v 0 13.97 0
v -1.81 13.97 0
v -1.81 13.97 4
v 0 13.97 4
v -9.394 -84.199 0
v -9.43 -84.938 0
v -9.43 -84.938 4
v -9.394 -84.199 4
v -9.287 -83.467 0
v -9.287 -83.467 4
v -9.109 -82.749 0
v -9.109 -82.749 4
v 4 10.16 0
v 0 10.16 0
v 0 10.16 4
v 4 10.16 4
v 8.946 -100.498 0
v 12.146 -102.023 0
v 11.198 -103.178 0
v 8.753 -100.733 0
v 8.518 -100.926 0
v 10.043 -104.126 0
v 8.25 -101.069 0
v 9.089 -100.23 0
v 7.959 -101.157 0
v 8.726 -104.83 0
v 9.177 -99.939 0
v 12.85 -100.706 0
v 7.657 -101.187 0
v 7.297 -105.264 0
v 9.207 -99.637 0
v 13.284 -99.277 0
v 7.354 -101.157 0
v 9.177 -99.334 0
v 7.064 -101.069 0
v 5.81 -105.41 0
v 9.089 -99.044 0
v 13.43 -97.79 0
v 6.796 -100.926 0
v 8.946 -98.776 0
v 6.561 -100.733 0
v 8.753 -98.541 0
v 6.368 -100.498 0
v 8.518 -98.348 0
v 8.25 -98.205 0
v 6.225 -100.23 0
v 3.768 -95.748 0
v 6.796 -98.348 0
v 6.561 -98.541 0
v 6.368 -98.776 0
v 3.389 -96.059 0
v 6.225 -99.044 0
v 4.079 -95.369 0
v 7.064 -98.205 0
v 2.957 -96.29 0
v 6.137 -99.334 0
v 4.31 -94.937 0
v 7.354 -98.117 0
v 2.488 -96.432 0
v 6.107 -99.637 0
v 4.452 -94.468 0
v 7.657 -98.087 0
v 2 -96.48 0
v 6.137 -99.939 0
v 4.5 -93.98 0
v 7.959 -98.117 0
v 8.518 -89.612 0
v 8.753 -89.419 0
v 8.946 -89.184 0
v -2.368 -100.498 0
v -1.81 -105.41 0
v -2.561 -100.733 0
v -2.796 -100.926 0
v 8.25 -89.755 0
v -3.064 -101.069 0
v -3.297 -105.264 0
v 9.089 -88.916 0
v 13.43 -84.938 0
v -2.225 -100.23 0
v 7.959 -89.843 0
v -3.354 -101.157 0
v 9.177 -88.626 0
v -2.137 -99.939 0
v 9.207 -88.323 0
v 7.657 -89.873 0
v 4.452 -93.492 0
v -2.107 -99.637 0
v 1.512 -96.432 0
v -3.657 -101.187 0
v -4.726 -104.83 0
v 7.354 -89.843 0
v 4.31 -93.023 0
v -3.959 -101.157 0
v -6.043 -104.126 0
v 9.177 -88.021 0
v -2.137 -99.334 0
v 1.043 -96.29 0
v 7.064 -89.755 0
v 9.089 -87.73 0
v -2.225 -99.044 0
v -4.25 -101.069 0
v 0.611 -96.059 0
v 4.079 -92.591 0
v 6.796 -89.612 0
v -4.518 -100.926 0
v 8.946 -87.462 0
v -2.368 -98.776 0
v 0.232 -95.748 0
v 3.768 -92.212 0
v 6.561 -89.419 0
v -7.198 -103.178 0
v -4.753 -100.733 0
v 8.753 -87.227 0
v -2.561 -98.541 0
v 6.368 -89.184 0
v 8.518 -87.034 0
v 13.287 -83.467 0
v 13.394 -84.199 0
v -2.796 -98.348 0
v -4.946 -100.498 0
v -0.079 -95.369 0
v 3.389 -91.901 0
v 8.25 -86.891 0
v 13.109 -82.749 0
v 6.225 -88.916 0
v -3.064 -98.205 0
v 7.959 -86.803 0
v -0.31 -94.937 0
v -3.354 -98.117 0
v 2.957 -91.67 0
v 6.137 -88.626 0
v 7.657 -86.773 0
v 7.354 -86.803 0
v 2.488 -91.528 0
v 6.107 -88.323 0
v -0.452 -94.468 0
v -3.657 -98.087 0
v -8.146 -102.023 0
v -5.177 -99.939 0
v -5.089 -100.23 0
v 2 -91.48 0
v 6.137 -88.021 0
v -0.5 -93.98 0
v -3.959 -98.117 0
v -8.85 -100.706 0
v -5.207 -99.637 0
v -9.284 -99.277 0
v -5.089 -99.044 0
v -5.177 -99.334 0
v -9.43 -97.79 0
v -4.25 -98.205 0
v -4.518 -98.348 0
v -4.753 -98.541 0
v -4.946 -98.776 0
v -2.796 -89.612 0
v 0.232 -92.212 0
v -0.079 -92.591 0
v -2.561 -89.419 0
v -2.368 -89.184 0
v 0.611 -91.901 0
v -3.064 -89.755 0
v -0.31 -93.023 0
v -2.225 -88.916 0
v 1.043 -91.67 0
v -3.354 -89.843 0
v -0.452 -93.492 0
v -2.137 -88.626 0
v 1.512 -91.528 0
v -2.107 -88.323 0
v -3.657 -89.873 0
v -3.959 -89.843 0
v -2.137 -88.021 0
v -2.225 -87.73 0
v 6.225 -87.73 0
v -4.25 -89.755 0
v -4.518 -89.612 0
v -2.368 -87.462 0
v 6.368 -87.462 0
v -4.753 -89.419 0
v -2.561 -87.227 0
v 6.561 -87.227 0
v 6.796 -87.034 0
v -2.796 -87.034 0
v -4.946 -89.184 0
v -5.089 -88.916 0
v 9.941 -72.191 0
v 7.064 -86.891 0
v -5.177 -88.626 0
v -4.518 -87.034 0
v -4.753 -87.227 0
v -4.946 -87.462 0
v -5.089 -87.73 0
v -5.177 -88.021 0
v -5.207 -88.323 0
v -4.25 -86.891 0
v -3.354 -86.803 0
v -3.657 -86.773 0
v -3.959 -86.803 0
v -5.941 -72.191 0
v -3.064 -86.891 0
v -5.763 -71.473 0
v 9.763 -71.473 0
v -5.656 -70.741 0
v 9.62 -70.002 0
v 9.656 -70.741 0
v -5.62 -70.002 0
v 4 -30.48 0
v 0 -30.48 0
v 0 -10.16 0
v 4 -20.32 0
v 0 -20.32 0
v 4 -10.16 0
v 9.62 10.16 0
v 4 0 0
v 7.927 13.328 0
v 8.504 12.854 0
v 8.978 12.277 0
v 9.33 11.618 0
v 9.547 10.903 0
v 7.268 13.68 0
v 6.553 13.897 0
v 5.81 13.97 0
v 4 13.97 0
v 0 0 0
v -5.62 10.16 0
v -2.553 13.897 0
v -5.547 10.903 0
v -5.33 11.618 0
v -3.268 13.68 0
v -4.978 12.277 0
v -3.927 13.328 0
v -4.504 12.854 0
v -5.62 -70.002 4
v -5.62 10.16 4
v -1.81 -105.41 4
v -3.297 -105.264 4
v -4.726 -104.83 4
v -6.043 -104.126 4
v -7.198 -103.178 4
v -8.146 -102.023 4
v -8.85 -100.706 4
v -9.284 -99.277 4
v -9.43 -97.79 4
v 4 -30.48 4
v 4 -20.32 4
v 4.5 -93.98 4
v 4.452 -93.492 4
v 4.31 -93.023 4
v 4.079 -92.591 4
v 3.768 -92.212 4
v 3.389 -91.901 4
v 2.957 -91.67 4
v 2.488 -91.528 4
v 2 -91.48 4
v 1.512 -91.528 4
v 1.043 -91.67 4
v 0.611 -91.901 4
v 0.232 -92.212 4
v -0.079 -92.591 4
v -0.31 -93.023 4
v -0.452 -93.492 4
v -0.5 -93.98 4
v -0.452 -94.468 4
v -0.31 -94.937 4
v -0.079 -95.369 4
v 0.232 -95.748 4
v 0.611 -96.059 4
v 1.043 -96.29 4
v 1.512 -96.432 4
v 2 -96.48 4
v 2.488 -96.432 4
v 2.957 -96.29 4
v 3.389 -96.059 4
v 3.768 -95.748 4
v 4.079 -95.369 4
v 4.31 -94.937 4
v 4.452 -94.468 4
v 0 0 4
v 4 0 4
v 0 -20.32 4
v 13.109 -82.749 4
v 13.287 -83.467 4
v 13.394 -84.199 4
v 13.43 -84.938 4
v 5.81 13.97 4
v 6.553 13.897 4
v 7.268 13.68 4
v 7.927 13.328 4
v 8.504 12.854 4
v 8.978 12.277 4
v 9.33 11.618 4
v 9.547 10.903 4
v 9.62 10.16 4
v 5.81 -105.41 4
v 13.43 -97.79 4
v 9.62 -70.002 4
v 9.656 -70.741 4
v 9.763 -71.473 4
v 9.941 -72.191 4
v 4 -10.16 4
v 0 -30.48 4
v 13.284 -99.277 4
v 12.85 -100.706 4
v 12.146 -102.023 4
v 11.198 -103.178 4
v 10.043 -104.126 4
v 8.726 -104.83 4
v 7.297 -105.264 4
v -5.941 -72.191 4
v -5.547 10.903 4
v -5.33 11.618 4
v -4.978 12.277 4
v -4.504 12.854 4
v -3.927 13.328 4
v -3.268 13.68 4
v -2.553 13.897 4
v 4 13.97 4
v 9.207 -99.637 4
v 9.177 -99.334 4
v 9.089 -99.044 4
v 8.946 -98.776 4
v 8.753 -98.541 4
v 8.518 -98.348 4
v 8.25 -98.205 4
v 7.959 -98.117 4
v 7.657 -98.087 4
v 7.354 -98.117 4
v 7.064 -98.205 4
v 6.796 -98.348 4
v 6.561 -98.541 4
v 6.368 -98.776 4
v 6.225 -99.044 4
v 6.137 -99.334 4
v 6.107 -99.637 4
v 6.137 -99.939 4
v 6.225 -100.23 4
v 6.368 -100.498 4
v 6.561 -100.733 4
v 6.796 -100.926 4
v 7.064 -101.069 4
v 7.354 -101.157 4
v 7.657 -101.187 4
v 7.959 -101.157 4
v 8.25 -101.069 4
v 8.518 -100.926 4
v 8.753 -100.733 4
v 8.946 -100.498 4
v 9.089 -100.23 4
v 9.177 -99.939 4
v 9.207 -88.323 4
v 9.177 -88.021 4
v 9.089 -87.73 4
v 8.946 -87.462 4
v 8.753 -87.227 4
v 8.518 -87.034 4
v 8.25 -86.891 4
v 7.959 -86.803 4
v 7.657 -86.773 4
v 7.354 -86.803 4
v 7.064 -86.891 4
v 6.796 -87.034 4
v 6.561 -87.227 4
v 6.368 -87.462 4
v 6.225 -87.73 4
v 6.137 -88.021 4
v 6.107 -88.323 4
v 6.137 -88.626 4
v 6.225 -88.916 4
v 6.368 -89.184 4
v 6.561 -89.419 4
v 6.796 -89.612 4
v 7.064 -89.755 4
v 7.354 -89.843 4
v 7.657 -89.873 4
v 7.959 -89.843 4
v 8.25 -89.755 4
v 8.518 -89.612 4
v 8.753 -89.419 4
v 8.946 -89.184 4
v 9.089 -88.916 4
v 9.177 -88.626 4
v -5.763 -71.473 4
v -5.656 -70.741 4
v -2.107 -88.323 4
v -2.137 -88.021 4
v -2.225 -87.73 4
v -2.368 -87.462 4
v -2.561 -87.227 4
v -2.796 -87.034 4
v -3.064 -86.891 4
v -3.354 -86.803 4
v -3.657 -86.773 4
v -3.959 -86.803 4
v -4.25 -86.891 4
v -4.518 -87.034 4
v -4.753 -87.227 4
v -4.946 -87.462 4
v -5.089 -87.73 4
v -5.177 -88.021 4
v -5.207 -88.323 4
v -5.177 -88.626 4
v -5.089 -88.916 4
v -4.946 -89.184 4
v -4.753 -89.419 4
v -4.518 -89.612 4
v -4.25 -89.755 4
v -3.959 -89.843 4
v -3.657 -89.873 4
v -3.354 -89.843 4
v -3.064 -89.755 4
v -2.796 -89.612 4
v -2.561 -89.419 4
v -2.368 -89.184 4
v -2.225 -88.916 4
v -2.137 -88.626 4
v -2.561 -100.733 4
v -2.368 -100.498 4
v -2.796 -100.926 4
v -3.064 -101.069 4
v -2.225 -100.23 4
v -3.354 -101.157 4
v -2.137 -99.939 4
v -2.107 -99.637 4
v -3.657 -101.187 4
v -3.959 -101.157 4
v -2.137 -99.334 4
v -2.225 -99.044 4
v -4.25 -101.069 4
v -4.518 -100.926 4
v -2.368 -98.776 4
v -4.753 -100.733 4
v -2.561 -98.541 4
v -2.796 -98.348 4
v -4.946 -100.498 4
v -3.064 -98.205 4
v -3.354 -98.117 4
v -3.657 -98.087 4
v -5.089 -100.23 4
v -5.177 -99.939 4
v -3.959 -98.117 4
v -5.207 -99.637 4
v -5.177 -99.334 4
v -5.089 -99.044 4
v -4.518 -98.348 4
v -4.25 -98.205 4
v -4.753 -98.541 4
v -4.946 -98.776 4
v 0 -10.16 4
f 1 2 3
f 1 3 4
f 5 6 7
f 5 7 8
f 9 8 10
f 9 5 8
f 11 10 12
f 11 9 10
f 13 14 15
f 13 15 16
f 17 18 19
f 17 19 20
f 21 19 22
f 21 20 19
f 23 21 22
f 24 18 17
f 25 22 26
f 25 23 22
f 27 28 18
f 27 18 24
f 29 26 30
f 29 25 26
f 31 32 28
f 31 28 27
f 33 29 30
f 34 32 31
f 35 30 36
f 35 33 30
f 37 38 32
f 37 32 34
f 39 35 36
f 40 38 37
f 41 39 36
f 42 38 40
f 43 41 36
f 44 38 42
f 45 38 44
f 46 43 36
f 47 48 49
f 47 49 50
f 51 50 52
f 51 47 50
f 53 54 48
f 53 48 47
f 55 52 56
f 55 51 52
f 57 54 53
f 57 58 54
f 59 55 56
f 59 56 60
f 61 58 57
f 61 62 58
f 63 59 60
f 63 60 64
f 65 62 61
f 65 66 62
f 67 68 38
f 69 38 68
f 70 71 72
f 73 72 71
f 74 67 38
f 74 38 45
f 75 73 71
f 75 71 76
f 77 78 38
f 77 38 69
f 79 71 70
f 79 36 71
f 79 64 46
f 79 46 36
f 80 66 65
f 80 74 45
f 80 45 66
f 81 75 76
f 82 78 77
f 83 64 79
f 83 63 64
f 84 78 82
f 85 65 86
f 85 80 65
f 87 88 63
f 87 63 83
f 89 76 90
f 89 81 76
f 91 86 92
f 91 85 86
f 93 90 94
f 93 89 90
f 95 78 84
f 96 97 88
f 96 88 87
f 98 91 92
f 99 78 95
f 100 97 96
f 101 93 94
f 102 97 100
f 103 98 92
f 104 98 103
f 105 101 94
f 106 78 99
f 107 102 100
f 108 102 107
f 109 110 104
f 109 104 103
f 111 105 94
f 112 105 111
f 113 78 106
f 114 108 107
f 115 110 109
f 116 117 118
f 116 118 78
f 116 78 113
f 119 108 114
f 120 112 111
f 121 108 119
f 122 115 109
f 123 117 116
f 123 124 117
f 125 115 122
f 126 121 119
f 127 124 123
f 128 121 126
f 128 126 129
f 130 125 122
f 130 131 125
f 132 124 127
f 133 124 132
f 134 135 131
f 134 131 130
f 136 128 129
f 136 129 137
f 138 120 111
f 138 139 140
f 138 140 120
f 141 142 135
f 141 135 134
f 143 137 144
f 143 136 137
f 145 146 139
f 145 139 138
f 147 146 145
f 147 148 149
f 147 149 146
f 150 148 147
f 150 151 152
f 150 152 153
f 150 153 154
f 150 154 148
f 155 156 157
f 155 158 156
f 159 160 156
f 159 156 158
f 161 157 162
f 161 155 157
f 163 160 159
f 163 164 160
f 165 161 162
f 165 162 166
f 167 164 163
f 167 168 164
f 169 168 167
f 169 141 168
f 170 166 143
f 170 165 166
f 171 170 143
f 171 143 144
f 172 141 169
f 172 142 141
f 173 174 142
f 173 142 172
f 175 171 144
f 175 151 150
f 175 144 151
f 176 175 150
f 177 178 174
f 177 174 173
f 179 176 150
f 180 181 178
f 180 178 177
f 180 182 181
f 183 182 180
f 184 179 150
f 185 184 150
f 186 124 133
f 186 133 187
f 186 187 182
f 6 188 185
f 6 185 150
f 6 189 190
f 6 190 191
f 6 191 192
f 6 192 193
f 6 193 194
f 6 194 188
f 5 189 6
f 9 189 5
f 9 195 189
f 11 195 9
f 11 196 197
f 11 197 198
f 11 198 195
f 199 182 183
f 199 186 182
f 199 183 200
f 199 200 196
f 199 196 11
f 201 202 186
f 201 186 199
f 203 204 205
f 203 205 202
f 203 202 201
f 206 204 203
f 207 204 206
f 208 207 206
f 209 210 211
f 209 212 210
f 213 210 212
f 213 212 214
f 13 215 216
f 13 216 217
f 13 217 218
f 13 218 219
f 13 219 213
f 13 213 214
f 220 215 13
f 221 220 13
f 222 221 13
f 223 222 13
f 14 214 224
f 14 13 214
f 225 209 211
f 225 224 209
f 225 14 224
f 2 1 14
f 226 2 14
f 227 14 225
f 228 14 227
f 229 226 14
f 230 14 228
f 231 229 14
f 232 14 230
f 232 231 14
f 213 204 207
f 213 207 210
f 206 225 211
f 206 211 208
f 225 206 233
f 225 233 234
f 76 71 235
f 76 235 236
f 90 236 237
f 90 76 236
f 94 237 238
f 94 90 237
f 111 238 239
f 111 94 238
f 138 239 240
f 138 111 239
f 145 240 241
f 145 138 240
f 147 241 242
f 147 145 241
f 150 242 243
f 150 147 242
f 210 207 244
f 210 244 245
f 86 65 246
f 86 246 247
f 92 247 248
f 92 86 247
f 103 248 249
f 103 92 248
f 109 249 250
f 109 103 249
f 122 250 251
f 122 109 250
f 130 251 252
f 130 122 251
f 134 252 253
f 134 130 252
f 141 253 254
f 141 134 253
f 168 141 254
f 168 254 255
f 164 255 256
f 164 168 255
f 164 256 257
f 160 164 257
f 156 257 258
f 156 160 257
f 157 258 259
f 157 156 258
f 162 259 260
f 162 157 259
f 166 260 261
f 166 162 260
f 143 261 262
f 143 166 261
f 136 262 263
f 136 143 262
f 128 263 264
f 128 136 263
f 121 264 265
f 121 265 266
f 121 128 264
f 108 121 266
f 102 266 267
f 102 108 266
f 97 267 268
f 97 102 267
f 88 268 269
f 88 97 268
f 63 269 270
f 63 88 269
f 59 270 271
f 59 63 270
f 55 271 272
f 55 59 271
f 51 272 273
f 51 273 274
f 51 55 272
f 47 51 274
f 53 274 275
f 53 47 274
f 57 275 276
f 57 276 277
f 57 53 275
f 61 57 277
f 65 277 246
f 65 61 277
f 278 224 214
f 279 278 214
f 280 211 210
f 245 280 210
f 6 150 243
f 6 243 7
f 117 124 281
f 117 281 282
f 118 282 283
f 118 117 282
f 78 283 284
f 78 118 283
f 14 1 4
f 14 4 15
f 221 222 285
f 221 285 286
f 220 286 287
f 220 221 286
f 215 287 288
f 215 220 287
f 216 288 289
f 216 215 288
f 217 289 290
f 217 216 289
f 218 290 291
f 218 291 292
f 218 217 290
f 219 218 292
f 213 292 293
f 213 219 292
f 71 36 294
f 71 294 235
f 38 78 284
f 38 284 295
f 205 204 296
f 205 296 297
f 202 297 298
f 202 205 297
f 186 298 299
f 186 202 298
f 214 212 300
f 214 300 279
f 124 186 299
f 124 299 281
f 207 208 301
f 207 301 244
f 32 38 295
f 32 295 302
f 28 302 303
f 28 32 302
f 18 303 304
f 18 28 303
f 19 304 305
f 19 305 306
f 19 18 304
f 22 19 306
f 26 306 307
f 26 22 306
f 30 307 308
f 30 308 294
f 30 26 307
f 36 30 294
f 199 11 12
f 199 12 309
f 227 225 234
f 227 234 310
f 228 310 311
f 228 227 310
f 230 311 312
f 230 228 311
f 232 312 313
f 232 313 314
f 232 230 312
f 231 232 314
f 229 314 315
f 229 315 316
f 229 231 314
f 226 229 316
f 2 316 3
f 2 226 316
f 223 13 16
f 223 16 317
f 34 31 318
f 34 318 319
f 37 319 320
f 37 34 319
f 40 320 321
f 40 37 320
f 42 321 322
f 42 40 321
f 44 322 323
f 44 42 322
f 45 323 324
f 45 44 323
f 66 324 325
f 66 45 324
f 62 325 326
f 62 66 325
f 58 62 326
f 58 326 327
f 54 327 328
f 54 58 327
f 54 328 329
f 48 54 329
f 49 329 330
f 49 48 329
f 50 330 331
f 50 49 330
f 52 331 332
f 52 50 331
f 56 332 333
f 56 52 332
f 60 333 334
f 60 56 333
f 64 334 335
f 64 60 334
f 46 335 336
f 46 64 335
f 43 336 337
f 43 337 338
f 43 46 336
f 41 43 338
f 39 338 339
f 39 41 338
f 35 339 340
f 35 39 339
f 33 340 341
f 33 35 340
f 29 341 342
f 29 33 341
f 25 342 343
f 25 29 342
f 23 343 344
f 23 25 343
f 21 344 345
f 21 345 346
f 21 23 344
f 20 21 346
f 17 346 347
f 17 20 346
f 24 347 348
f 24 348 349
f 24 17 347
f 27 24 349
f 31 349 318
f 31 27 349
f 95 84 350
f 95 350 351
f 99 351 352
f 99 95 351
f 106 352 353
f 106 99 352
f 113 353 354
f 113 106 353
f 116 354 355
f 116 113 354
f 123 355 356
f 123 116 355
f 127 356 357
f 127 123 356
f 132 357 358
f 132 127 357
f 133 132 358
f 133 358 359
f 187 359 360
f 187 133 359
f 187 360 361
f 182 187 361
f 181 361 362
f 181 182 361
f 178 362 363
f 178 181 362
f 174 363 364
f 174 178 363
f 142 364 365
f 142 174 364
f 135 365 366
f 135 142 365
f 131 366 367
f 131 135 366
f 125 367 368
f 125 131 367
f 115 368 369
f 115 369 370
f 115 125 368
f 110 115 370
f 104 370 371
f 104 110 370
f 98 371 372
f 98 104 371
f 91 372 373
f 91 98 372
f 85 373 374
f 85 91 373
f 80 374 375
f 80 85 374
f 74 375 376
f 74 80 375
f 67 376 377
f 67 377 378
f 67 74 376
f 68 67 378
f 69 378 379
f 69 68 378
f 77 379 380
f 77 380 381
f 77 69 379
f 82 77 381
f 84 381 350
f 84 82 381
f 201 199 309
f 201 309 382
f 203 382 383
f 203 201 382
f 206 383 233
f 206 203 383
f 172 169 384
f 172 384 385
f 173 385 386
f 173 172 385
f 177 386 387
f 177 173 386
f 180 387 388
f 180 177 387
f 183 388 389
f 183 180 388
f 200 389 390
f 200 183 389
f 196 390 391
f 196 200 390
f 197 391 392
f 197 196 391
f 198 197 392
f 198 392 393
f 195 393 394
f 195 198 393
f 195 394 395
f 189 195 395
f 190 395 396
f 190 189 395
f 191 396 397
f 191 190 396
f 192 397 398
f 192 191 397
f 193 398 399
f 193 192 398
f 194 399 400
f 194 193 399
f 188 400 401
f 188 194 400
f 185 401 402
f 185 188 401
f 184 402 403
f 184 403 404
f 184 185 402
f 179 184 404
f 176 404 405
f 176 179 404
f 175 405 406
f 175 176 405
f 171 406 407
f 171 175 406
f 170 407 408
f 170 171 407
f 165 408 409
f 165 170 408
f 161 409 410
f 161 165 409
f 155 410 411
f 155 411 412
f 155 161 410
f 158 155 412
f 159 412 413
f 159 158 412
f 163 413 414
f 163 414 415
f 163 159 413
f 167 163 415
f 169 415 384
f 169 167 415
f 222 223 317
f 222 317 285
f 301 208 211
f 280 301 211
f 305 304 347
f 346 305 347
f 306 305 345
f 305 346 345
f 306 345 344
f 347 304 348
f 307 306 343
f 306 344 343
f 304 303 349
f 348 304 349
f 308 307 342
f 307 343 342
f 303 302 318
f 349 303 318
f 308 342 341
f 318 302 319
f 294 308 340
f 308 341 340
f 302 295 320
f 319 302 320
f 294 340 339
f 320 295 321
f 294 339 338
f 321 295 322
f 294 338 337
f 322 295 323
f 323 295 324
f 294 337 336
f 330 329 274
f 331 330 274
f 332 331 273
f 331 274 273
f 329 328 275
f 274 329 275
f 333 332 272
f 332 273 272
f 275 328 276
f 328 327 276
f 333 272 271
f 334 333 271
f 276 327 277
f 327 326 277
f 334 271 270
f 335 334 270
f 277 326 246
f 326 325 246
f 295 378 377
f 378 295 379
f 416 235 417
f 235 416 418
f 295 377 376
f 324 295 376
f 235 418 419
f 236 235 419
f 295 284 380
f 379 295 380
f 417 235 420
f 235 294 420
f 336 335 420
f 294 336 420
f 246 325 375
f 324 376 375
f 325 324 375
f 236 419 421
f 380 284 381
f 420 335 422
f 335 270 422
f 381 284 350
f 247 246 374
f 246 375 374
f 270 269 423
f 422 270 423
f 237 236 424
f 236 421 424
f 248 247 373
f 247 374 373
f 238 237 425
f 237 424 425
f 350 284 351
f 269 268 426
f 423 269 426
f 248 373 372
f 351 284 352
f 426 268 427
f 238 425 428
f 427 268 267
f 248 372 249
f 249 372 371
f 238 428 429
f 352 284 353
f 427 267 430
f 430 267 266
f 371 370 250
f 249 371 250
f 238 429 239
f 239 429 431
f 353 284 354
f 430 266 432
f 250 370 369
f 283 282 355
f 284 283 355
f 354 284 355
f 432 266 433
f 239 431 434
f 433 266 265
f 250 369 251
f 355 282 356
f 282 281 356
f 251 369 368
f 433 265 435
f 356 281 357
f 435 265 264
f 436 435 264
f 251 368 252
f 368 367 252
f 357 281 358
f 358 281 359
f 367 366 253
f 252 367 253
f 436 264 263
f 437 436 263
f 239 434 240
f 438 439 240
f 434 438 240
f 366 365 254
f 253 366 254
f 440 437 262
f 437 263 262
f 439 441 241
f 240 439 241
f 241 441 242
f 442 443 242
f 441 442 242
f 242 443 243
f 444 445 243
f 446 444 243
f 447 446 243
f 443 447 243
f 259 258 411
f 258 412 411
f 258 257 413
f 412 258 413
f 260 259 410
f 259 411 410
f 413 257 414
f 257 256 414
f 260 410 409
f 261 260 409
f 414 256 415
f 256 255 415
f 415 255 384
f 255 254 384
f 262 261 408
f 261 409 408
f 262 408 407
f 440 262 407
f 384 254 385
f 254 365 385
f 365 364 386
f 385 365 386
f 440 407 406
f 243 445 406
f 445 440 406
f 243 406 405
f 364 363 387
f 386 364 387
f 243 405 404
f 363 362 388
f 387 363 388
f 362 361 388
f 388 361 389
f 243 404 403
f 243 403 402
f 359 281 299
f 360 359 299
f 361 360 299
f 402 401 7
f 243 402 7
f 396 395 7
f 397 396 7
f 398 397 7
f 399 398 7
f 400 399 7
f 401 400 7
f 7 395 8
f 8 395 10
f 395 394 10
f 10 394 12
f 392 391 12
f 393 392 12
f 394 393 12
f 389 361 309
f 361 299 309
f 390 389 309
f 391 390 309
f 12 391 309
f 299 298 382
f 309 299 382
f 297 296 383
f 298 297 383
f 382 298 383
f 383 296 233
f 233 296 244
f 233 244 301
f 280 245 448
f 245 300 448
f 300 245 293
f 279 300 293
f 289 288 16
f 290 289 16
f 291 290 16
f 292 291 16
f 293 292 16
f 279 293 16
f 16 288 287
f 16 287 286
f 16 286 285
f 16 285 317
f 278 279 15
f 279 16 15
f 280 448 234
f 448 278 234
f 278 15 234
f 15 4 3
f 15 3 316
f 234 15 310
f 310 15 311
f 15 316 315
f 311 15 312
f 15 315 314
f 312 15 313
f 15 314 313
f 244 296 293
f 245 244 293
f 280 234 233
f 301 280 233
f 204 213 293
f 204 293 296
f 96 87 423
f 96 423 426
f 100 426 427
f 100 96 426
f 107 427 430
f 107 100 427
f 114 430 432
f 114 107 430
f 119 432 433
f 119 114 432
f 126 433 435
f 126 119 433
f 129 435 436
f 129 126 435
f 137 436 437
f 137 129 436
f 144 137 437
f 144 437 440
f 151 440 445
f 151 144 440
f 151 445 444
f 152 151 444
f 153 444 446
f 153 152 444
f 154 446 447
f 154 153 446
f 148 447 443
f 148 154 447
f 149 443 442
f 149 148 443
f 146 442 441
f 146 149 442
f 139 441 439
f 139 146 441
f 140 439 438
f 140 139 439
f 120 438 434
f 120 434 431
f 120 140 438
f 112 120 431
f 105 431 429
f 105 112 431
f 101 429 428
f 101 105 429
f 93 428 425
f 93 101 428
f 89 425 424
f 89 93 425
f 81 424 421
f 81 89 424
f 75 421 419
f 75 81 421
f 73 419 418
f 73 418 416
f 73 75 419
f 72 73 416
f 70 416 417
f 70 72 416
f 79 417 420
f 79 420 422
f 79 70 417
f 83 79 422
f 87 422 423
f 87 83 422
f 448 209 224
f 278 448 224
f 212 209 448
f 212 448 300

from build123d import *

# Parameters (mm, degrees)
SKETCH1_R           = 2.5
SKETCH1_R_2         = 1.55
SKETCH1_W           = 4
SKETCH1_H           = 10.16
BOSS_EXTRUDE1_DEPTH = 4


with BuildPart() as part:
    # Sketch1 → Boss-Extrude1 (new body)
    with BuildSketch(Plane.XY):
        with BuildLine():
            Line((0, 10.16), (4, 10.16))
            Line((4, 10.16), (4, 13.97))
            Line((4, 13.97), (5.81, 13.97))
            ThreePointArc((5.81, 13.97), (8.504076836, 12.854076836), (9.62, 10.16))
            Line((9.62, 10.16), (9.62, -70.001621467))
            ThreePointArc((9.62, -70.001621467), (9.700768986, -71.10814563), (9.941363707, -72.191212355))
            Line((9.941363707, -72.191212355), (13.108636293, -82.748787645))
            ThreePointArc((13.108636293, -82.748787645), (13.349231014, -83.83185437), (13.43, -84.938378533))
            Line((13.43, -84.938378533), (13.43, -97.79))
            ThreePointArc((13.43, -97.79), (11.198153673, -103.178153673), (5.81, -105.41))
            Line((5.81, -105.41), (-1.81, -105.41))
            ThreePointArc((-1.81, -105.41), (-7.198153673, -103.178153673), (-9.43, -97.79))
            Line((-9.43, -97.79), (-9.43, -84.938378533))
            ThreePointArc((-9.43, -84.938378533), (-9.349231014, -83.83185437), (-9.108636293, -82.748787645))
            Line((-9.108636293, -82.748787645), (-5.941363707, -72.191212355))
            ThreePointArc((-5.941363707, -72.191212355), (-5.700768986, -71.10814563), (-5.62, -70.001621467))
            Line((-5.62, -70.001621467), (-5.62, 10.16))
            ThreePointArc((-5.62, 10.16), (-4.504076836, 12.854076836), (-1.81, 13.97))
            Line((-1.81, 13.97), (0, 13.97))
            Line((0, 13.97), (0, 10.16))
        make_face()
        with Locations((2, -93.98)):
            Circle(SKETCH1_R, mode=Mode.SUBTRACT)
        with Locations((7.656854249, -88.323145751)):
            Circle(SKETCH1_R_2, mode=Mode.SUBTRACT)
        with Locations((-3.656854249, -88.323145751)):
            Circle(SKETCH1_R_2, mode=Mode.SUBTRACT)
        with Locations((-3.656854249, -99.636854249)):
            Circle(SKETCH1_R_2, mode=Mode.SUBTRACT)
        with Locations((7.656854249, -99.636854249)):
            Circle(SKETCH1_R_2, mode=Mode.SUBTRACT)
        with Locations((2, -5.08)):
            Rectangle(SKETCH1_W, SKETCH1_H, mode=Mode.SUBTRACT)
        with Locations((2, -25.4)):
            Rectangle(SKETCH1_W, SKETCH1_H, mode=Mode.SUBTRACT)
    extrude(amount=BOSS_EXTRUDE1_DEPTH)


solid = part.part
